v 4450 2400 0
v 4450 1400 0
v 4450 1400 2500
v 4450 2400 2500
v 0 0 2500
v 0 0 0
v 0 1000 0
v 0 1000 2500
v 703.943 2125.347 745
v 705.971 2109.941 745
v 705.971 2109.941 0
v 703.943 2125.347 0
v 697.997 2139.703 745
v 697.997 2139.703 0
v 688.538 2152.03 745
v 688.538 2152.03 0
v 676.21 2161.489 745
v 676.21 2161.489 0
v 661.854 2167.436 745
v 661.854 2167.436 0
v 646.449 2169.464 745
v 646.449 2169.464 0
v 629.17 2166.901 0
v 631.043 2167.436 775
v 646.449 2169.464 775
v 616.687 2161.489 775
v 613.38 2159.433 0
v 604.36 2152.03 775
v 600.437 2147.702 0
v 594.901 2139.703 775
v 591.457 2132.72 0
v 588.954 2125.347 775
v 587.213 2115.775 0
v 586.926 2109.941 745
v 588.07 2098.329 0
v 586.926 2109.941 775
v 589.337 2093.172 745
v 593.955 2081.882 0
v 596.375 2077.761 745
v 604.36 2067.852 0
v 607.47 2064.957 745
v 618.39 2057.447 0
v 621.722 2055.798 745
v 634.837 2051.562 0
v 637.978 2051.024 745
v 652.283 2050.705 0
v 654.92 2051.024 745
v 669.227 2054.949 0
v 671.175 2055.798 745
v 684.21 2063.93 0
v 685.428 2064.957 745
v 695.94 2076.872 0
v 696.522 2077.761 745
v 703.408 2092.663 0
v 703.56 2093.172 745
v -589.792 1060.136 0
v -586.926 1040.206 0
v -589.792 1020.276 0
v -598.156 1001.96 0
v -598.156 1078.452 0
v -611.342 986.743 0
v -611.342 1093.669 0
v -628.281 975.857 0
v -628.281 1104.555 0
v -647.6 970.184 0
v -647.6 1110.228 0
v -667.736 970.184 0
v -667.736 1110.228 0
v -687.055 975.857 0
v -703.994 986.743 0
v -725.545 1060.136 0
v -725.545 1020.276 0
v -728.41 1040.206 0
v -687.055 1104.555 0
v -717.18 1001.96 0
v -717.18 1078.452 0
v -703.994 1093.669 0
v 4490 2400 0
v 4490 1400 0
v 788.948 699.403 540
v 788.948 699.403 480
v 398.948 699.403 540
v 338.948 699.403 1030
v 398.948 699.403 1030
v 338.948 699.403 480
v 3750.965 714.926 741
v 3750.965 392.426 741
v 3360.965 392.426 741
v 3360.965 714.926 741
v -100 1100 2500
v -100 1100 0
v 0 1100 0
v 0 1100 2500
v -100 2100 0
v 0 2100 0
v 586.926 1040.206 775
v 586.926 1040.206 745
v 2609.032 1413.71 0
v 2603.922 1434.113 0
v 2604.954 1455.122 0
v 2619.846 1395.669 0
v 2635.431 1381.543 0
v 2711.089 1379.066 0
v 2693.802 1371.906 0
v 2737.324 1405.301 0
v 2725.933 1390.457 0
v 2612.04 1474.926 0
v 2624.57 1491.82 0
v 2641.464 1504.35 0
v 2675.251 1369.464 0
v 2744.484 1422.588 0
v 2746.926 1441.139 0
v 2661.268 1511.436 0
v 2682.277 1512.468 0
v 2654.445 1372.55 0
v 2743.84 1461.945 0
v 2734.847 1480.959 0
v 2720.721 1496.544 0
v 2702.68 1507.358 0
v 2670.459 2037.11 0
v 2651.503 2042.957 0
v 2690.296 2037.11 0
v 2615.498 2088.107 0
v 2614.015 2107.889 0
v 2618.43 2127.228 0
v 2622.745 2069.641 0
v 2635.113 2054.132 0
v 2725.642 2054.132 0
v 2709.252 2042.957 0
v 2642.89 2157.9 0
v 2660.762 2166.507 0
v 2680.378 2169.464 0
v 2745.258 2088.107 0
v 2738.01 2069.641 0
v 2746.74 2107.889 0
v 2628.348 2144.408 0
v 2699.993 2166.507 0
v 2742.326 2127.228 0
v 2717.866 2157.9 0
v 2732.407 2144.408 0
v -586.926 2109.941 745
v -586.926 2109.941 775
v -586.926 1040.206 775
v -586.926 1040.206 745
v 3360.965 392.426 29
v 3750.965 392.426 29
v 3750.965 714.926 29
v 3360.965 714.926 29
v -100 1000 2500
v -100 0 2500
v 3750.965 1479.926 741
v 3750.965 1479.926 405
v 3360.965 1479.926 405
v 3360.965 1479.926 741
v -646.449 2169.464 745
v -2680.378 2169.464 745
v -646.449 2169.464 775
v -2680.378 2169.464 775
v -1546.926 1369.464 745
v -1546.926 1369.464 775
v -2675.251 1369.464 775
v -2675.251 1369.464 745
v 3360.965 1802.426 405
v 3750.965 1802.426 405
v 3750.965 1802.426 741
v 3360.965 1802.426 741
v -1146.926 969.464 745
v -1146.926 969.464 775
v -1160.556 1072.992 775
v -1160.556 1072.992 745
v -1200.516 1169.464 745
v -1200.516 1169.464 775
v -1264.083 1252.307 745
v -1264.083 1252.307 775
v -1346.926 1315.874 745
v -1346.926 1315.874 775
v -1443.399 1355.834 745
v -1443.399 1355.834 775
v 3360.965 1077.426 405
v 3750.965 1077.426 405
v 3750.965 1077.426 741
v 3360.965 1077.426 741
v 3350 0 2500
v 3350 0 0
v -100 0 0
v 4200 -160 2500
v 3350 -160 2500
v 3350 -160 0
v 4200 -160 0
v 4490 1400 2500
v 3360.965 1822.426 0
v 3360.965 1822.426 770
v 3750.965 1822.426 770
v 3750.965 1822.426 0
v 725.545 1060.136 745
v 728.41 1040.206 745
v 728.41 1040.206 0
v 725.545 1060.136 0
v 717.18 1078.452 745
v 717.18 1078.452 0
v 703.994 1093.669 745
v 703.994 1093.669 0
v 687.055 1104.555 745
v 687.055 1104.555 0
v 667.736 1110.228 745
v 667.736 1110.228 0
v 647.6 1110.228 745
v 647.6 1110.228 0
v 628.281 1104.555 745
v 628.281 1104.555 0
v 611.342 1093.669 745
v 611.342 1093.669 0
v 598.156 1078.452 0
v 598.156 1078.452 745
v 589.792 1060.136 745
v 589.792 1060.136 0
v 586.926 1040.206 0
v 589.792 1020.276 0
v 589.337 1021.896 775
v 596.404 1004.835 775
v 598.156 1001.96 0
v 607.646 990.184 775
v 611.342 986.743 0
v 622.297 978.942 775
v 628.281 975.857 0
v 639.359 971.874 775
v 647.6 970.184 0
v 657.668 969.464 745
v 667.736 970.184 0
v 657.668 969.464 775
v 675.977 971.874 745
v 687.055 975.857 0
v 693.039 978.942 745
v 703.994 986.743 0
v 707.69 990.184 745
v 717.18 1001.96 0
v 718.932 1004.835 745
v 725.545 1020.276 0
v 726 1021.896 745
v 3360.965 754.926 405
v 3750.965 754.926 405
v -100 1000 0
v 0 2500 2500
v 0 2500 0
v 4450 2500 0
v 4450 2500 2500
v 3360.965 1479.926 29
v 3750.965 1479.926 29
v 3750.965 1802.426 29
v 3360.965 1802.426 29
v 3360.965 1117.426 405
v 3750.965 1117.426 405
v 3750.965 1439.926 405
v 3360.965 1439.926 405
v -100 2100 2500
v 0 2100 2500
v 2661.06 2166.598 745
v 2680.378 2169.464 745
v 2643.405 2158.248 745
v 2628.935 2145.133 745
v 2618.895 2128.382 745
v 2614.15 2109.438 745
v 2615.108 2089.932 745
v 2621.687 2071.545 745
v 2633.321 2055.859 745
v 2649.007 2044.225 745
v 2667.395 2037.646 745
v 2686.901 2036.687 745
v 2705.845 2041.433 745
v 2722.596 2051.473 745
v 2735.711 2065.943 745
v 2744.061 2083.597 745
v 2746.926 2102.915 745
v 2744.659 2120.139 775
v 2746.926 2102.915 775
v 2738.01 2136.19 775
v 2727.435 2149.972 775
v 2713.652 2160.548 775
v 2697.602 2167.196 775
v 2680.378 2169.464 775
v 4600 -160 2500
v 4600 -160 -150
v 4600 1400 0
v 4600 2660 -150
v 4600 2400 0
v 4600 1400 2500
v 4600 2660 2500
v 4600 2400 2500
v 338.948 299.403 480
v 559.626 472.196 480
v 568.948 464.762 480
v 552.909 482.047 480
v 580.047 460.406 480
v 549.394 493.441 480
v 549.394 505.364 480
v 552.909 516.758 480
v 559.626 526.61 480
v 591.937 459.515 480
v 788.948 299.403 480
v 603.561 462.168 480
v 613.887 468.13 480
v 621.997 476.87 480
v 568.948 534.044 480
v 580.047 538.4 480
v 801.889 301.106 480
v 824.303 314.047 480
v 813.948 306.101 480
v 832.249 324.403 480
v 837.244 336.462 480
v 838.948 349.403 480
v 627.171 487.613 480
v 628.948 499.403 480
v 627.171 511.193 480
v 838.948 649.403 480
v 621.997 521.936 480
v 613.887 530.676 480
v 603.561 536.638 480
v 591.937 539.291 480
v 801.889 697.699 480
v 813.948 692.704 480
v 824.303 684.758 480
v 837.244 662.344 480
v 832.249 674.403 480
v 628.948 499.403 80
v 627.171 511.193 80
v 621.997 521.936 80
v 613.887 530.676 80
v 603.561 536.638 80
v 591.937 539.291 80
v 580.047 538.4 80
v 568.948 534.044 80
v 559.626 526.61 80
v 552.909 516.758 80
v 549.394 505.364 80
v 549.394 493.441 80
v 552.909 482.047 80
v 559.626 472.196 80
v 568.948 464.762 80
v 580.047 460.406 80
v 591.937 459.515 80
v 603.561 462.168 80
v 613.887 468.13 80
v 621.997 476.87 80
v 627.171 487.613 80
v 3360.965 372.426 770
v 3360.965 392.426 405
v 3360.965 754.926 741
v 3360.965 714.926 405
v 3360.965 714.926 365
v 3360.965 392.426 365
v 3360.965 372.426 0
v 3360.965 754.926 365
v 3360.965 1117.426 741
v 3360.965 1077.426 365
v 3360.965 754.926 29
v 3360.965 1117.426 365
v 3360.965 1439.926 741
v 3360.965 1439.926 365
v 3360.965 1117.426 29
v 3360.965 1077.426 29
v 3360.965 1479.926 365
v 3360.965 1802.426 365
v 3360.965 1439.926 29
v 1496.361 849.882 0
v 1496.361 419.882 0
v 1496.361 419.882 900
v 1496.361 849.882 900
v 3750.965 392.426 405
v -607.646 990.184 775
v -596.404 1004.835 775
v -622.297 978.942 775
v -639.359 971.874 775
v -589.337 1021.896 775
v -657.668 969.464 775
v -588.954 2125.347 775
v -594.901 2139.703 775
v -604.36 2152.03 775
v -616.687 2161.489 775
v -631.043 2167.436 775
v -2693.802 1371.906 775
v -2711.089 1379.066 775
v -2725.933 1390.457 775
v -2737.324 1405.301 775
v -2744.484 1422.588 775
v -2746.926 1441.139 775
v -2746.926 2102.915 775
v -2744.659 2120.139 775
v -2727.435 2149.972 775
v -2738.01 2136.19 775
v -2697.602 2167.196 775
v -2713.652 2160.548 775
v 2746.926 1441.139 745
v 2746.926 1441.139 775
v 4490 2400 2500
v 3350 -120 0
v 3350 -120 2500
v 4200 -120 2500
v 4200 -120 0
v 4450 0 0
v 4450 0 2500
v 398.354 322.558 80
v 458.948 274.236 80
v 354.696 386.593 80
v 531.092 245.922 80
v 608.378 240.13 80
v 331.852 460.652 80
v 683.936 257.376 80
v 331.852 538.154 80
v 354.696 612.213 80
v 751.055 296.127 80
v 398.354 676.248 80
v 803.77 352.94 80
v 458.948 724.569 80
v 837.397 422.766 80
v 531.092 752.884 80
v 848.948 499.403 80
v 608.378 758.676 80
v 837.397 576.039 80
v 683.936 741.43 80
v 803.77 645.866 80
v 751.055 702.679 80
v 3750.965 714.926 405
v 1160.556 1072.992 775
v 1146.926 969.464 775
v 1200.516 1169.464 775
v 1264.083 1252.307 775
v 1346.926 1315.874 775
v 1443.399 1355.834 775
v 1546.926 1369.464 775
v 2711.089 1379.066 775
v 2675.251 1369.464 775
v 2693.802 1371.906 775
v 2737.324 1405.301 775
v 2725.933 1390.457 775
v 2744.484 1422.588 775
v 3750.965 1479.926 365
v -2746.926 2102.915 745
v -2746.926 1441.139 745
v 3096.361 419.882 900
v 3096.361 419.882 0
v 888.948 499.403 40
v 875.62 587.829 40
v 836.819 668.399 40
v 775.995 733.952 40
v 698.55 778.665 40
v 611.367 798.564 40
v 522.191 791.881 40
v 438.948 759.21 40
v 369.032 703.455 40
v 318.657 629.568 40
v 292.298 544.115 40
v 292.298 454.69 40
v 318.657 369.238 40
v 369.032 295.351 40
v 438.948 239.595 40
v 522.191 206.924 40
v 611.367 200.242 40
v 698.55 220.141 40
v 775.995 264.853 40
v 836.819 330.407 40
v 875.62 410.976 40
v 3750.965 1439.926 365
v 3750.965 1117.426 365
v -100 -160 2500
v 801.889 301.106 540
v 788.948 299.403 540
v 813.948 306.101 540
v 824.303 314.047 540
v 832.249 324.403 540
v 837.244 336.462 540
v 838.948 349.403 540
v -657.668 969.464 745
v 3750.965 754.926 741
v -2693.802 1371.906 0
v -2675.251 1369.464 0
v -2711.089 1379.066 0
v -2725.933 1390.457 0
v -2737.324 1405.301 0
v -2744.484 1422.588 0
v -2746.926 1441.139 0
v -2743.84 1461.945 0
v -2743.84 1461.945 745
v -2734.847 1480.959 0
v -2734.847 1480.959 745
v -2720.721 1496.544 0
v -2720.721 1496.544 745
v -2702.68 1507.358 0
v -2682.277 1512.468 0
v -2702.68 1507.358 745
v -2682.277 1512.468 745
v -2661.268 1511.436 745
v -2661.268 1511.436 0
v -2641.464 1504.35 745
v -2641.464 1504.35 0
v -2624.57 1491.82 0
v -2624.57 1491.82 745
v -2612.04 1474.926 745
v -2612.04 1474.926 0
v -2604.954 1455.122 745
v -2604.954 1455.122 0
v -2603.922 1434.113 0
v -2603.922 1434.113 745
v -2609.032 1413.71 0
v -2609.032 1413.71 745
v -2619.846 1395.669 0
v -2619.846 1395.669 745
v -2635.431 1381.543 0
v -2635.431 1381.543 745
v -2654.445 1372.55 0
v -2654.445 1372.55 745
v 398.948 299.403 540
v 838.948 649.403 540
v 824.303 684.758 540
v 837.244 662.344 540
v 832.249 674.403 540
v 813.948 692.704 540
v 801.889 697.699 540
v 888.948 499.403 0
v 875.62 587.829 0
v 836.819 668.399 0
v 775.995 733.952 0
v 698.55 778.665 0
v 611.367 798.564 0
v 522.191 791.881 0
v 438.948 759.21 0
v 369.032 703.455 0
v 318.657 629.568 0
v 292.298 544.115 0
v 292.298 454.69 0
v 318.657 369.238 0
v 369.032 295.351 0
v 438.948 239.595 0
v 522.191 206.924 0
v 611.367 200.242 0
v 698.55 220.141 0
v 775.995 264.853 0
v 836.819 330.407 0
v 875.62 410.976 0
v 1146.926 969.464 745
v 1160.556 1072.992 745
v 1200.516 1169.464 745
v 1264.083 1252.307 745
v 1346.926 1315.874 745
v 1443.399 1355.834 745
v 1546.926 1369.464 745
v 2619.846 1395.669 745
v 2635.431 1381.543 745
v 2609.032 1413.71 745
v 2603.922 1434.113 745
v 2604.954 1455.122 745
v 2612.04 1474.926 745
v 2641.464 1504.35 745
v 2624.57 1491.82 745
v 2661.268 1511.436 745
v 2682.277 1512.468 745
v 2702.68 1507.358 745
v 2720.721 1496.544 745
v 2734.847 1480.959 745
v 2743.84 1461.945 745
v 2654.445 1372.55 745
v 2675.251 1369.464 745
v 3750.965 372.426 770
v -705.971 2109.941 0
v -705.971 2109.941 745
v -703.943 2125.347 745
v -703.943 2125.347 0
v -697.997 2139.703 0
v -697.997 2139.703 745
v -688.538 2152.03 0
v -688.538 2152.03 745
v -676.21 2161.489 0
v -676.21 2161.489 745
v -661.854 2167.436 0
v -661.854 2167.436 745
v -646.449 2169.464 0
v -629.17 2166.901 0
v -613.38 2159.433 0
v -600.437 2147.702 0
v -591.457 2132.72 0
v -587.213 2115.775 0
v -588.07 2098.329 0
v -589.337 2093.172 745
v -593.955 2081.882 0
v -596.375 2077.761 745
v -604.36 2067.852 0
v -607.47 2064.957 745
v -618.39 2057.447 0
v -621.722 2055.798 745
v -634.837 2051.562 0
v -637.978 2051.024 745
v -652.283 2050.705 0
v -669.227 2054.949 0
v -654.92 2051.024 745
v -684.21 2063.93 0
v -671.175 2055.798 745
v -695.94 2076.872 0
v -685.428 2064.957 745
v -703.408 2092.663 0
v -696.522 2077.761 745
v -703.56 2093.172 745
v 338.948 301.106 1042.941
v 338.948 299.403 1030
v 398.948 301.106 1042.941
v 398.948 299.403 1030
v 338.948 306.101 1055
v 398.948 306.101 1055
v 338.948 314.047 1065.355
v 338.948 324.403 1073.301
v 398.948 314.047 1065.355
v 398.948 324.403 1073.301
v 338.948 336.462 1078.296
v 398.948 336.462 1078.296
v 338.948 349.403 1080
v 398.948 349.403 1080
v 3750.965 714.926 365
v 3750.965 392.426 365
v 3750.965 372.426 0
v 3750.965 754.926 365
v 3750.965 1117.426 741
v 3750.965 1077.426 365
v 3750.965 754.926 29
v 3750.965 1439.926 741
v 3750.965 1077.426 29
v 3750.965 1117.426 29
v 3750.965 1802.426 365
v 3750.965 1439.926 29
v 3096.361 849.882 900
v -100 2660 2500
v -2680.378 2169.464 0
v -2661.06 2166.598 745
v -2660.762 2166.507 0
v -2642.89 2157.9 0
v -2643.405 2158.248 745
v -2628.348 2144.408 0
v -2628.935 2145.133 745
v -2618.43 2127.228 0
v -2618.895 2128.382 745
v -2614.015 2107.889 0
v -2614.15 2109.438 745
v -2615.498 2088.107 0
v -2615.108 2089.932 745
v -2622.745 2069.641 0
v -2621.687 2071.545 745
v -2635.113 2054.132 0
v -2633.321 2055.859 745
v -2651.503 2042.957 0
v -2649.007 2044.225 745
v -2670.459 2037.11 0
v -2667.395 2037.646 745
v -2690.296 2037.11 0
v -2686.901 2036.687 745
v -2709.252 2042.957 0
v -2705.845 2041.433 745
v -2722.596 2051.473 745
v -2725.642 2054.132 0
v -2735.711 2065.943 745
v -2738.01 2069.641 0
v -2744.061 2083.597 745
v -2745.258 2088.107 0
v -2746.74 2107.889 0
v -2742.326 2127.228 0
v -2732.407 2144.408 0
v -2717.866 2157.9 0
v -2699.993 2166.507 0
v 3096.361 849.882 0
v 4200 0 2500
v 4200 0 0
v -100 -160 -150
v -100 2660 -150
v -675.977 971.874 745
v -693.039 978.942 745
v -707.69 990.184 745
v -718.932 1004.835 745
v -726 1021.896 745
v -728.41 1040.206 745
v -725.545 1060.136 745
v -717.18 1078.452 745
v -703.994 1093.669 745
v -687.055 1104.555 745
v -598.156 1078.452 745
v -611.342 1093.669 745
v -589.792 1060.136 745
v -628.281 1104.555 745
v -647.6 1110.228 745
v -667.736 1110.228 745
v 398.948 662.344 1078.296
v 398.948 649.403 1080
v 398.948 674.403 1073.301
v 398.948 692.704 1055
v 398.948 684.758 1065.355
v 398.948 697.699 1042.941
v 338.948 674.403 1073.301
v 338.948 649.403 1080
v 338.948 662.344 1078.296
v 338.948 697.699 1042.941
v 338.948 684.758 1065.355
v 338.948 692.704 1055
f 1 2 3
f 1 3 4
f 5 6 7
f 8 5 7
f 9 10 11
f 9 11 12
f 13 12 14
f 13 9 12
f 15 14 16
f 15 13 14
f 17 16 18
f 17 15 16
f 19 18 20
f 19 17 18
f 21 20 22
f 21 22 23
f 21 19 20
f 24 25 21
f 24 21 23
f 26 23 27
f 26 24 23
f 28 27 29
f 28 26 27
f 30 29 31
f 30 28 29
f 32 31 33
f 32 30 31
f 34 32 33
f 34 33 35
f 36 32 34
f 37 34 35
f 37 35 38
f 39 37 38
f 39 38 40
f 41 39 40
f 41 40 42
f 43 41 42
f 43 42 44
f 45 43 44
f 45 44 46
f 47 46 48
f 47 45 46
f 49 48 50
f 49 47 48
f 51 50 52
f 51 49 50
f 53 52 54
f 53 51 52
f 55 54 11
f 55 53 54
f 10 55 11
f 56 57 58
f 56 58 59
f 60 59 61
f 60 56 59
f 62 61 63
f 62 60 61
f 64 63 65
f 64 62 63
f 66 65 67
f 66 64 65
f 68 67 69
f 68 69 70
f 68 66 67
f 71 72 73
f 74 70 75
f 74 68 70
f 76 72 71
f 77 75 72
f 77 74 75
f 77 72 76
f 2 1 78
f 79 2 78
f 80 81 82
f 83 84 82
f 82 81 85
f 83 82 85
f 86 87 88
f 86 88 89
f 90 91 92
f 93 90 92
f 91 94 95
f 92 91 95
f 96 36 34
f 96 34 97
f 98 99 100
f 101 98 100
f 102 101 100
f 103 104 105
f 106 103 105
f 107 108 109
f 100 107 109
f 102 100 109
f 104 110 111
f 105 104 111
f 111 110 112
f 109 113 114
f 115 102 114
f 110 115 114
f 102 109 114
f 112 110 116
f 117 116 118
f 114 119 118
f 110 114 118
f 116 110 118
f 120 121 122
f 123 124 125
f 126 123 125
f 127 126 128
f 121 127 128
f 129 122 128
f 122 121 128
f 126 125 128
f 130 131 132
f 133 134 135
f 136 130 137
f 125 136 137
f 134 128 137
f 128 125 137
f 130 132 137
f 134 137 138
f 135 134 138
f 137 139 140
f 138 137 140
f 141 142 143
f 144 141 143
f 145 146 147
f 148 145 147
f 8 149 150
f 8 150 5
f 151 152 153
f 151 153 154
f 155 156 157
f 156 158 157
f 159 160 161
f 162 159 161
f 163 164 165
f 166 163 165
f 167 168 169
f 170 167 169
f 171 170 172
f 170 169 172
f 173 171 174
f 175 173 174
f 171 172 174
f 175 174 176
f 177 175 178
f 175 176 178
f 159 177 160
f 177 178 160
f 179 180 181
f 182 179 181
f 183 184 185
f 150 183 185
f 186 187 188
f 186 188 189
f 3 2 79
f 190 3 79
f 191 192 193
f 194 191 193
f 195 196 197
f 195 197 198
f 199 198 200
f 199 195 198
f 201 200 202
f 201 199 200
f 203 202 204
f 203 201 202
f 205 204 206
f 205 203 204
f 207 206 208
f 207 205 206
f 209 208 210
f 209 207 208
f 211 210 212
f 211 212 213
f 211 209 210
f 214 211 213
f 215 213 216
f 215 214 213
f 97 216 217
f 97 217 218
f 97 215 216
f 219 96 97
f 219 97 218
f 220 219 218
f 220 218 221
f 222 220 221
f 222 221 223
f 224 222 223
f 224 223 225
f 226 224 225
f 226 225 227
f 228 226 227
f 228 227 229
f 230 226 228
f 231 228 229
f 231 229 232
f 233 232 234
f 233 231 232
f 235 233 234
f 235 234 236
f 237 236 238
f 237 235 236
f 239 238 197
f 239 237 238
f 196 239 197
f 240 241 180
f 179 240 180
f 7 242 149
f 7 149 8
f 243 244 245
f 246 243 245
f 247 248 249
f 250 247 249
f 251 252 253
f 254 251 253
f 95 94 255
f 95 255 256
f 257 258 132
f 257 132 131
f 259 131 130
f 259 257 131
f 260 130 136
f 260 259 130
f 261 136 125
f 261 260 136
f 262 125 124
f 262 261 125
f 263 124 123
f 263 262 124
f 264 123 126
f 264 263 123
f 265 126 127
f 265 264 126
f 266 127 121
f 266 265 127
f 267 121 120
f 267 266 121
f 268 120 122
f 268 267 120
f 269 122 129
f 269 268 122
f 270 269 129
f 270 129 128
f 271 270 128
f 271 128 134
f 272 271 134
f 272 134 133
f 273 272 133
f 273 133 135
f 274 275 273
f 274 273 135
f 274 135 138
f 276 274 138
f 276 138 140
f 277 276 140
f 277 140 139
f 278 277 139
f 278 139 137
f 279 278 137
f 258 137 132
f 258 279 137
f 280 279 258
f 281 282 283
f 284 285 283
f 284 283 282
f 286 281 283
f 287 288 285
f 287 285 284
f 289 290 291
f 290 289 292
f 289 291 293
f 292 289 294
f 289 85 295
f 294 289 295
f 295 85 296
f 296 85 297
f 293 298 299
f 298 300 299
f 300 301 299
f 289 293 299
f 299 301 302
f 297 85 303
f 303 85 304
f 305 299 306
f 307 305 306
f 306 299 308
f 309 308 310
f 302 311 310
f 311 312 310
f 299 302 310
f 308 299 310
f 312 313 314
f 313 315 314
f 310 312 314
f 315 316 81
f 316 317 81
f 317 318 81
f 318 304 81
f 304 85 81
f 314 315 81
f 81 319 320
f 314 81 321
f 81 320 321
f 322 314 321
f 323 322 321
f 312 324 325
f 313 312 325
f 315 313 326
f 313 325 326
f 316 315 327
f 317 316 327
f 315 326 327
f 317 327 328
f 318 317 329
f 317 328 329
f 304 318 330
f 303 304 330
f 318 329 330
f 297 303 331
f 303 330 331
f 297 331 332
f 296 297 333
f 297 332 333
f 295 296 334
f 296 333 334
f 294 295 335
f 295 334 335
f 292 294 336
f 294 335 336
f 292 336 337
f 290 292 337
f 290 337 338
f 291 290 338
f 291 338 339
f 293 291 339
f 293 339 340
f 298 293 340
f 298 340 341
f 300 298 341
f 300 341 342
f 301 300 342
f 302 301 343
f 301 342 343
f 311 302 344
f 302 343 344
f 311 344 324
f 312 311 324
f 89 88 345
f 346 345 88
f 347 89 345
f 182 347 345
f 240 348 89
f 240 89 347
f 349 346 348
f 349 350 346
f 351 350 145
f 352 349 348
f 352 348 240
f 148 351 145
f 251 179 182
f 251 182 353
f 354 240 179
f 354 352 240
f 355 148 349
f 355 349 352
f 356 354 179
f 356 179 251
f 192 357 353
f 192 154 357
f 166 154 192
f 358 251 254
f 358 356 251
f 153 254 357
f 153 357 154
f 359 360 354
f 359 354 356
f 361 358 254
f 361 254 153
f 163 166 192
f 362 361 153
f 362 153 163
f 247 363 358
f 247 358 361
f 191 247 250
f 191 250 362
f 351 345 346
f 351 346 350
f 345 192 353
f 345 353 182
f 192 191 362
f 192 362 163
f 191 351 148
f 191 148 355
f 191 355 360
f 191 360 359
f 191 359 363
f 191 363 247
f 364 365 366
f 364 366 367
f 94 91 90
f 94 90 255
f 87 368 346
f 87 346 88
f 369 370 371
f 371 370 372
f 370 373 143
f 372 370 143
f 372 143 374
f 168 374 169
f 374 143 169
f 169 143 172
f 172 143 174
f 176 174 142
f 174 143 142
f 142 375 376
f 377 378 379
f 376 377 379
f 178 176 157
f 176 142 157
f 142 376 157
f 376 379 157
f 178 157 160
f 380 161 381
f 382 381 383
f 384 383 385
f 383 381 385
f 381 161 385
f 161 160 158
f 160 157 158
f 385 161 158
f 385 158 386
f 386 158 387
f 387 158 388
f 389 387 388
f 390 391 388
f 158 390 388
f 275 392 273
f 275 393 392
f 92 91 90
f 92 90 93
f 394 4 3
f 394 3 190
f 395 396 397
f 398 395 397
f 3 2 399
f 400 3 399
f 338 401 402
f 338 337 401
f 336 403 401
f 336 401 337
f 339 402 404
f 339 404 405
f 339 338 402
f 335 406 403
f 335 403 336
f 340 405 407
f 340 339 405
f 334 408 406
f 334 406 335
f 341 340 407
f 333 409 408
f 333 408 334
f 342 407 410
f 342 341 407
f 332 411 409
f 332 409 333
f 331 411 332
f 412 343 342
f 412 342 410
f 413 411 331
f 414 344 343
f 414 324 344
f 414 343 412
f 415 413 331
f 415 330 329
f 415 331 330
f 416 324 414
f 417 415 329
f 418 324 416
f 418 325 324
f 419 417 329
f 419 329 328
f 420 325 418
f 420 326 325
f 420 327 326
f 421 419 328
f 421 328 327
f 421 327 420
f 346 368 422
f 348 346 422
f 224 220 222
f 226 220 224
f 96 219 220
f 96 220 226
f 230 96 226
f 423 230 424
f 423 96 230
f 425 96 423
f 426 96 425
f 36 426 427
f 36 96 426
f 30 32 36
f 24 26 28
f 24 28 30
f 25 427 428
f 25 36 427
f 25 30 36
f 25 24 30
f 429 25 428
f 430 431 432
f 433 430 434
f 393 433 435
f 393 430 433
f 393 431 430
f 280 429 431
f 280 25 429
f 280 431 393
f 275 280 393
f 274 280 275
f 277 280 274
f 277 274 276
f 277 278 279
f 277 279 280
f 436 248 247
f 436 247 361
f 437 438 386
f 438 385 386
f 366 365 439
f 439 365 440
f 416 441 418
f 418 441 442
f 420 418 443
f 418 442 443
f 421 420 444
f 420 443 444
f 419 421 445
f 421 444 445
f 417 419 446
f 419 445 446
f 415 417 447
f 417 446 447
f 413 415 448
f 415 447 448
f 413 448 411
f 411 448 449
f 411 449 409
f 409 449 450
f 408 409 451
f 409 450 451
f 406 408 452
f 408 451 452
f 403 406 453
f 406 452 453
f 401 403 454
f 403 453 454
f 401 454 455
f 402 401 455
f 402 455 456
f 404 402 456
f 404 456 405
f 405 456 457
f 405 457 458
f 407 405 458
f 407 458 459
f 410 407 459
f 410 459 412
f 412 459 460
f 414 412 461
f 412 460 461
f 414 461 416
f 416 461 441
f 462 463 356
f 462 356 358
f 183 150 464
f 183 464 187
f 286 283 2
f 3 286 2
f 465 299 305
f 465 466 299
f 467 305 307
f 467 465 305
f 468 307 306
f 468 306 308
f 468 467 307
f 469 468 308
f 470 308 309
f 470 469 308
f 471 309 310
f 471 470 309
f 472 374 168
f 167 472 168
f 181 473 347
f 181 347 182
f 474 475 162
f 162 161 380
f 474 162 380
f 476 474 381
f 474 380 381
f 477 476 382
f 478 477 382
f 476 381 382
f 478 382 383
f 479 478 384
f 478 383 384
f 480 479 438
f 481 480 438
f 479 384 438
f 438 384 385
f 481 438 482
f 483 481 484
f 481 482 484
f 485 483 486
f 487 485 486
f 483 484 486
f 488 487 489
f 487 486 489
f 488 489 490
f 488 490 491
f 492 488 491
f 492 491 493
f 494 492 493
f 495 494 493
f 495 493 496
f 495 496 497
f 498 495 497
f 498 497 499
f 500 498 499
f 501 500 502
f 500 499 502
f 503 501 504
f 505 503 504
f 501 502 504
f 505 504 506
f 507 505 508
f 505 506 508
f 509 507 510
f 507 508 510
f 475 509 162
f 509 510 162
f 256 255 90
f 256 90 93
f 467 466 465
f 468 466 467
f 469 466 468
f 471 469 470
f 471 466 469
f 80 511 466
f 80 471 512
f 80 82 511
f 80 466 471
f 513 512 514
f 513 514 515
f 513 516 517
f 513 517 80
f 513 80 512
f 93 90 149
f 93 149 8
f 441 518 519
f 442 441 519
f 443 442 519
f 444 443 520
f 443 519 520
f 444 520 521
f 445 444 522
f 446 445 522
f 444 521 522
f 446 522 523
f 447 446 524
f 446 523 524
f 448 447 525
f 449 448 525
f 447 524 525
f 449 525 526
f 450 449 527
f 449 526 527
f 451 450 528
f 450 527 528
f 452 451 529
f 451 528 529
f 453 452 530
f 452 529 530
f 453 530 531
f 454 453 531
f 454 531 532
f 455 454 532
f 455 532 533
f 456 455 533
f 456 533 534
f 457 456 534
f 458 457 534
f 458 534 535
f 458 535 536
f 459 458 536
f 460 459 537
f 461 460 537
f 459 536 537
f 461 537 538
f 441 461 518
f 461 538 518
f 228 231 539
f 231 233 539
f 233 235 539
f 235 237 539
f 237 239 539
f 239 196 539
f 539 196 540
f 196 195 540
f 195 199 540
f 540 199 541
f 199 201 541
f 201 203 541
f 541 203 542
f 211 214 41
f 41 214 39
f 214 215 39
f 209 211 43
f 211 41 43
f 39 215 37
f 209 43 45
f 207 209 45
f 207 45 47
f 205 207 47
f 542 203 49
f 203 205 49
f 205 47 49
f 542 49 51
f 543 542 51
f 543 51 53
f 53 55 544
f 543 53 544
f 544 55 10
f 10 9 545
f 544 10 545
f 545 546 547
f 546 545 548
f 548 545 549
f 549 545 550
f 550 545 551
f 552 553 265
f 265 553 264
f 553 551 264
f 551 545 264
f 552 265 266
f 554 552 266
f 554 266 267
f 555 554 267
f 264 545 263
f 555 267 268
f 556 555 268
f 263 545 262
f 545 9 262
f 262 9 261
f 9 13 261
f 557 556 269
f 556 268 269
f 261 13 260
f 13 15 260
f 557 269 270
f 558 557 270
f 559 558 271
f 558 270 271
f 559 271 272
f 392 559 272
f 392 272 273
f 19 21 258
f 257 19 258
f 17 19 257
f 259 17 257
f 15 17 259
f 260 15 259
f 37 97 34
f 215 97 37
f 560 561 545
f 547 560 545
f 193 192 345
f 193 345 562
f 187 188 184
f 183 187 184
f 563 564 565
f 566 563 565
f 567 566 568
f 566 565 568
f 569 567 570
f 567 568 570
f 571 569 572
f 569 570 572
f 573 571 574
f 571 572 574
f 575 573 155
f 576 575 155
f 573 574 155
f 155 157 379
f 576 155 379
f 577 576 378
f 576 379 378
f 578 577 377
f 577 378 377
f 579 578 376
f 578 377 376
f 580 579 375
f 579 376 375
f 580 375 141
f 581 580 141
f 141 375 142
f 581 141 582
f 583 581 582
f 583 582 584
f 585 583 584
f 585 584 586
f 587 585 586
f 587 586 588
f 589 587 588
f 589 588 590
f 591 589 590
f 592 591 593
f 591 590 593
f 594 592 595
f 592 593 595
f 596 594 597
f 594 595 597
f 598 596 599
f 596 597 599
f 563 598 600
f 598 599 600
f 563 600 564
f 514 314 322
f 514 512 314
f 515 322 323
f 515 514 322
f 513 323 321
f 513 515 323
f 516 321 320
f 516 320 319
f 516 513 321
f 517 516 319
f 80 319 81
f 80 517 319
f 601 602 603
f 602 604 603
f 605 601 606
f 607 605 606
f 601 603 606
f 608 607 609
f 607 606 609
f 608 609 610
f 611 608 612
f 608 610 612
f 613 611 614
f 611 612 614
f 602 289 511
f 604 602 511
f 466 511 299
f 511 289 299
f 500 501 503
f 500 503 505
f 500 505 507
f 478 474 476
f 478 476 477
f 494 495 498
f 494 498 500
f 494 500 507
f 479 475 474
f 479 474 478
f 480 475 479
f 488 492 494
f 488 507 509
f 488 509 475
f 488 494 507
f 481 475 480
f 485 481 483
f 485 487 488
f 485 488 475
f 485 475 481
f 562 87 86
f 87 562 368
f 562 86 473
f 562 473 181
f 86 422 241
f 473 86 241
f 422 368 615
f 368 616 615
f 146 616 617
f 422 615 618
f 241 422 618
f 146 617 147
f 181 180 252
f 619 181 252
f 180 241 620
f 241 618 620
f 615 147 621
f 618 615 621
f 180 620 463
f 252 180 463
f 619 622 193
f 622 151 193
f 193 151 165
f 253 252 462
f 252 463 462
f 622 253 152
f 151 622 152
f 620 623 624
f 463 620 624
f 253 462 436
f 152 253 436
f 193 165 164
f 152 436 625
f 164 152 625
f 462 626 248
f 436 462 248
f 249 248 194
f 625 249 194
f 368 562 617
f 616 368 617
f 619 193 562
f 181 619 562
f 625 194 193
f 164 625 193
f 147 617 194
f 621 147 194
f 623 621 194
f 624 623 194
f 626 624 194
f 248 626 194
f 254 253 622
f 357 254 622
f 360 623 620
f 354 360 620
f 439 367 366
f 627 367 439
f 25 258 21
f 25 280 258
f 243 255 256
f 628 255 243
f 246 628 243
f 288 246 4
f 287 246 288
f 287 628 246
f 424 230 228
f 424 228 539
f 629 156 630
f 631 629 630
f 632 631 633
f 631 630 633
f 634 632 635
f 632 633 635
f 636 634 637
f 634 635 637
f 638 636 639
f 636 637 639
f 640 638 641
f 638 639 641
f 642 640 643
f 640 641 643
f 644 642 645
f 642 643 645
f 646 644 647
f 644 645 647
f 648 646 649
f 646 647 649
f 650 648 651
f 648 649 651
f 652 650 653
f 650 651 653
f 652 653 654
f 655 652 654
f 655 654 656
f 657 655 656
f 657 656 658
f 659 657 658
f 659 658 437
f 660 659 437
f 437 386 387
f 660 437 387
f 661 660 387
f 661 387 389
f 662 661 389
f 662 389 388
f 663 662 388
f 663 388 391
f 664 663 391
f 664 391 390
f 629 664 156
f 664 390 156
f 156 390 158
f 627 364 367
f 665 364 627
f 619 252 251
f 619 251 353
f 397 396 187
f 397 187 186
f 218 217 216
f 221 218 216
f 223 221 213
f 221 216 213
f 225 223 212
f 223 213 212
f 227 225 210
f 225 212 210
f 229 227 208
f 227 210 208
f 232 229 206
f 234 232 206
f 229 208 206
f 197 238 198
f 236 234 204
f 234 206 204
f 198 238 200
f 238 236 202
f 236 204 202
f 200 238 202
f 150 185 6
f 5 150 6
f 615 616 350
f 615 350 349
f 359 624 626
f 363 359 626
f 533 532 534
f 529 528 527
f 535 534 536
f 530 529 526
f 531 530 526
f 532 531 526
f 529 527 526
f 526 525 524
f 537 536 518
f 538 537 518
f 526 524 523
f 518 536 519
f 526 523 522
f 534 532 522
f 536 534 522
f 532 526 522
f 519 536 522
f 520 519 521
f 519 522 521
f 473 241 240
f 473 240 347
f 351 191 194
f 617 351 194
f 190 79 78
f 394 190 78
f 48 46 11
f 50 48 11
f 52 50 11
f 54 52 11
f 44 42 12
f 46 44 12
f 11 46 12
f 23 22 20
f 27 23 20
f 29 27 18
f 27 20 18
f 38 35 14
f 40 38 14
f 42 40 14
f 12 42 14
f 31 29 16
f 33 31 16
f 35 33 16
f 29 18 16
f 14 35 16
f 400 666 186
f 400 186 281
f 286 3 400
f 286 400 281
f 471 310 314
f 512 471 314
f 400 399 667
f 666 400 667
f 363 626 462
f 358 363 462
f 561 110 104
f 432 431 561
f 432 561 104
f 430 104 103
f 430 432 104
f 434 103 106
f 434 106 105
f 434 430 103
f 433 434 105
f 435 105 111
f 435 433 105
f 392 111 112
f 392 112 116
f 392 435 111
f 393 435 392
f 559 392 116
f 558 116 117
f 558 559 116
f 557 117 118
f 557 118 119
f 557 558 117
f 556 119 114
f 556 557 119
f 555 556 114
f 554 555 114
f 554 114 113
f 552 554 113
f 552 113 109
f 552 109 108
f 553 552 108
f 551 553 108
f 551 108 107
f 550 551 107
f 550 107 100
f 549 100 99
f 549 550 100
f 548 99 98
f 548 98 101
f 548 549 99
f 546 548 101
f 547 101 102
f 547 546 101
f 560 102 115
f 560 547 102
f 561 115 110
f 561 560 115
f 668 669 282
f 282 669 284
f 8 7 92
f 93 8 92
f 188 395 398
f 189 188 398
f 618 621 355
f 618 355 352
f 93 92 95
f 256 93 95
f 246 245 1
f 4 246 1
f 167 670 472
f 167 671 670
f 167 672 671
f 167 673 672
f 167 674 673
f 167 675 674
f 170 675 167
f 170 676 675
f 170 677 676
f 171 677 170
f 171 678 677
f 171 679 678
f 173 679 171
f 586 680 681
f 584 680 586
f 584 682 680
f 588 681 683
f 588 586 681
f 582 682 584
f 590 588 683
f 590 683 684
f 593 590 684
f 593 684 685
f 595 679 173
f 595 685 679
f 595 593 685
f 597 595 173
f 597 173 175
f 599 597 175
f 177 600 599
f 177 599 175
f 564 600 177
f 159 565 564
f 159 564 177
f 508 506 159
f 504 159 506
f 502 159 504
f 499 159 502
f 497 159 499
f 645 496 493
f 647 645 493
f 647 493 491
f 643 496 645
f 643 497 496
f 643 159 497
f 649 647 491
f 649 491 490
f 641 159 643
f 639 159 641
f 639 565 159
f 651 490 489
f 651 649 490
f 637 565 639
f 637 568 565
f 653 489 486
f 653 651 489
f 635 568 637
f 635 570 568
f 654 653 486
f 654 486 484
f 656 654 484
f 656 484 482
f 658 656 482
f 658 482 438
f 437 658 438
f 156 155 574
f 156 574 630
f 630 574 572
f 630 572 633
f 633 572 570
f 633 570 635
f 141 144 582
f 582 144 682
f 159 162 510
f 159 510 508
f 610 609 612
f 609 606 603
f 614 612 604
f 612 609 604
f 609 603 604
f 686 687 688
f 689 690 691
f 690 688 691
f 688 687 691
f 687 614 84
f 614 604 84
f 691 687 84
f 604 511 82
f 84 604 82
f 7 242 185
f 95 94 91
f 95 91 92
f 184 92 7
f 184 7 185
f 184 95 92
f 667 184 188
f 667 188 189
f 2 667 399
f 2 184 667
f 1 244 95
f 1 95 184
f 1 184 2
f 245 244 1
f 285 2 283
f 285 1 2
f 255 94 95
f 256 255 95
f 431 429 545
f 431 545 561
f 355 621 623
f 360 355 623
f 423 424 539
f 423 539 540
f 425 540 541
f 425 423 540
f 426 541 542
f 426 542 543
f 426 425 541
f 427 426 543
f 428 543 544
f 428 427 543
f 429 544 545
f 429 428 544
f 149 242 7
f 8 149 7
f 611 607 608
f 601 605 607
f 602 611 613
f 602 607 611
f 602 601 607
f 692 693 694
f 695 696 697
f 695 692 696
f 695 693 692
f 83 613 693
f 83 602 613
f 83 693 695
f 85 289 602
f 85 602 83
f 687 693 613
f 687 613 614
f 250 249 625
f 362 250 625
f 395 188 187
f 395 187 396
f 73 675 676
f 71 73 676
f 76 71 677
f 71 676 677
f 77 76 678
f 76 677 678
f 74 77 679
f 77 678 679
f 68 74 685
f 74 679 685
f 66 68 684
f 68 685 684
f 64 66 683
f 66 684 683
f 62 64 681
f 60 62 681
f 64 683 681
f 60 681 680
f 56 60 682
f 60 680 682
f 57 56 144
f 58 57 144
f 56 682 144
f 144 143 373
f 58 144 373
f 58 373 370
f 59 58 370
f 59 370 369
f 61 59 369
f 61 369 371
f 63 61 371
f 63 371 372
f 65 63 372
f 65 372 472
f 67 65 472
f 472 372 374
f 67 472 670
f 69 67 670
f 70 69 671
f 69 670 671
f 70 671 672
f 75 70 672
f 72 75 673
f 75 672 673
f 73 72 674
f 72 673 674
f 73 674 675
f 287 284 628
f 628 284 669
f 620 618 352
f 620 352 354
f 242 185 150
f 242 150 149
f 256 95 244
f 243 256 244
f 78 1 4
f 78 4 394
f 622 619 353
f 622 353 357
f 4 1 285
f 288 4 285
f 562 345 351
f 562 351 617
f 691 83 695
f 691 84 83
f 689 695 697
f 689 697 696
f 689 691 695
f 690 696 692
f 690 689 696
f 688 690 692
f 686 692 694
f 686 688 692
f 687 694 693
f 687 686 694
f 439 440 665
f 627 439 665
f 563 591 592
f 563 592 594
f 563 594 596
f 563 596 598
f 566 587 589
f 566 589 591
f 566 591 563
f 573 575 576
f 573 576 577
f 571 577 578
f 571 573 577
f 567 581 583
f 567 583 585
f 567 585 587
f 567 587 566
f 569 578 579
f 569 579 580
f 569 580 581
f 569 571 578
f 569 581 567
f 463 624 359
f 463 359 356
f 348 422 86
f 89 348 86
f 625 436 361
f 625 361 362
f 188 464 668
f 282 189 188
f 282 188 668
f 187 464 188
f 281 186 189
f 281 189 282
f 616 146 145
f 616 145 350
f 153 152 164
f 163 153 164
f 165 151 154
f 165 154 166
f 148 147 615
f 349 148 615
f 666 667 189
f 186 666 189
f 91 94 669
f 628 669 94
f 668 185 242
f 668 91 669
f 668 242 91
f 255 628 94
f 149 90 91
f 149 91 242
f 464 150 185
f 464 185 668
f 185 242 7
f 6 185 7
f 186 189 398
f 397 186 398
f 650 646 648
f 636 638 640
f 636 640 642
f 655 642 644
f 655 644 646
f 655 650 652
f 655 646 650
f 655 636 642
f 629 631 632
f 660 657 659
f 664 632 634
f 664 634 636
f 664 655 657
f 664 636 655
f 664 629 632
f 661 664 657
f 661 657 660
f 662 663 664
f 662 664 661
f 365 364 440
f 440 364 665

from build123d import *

# Parameters (mm, degrees)
F0_W      = 100
F0_H      = 1000
F0_H_2    = 100
F0_W_2    = 850
F0_H_3    = 120
F0_H_4    = 40
F0_W_3    = 110
F0_W_4    = 40
F1_DEPTH  = 150
F2_DEPTH  = 150
F3_DEPTH  = 2500
F4_DEPTH  = 2500
F5_DEPTH  = 2500
F8_DEPTH  = 15
F9_DEPTH  = 760
F11_W     = 1600
F11_H     = 430
F12_DEPTH = 900
F13_W     = 390
F13_H     = 1450
F14_DEPTH = 770
F15_W     = 322.5
F15_H     = 336
F16_DEPTH = 390
F17_R     = 300
F18_DEPTH = 80
F19_R     = 40
F20_DEPTH = 400
F21_W     = 440
F21_H     = 400
F21_W_2   = 60
F22_DEPTH = 60
F23_DEPTH = 600
F24_R     = 50
F25_SIZE  = 40


with BuildPart() as f1:
    # F0 (on Top) → F1 (new body)
    with BuildSketch(Plane.XY):
        Polygon((300, 2500), (300, 0), (3350, 0), (4200, 0), (4450, 0), (4450, 1400), (4450, 2400), (4450, 2500), align=None)
        Polygon((0, 2500), (300, 2500), (4450, 2500), (4450, 2400), (4490, 2400), (4600, 2400), (4600, 2660), (-100, 2660), (-100, 2100), (0, 2100), align=None)
        with Locations((-50, 1600)):
            Rectangle(F0_W, F0_H)
        with Locations((-50, 1050)):
            Rectangle(F0_W, F0_H_2)
        with Locations((-50, 500)):
            Rectangle(F0_W, F0_H)
        Polygon((300, 0), (0, 0), (-100, 0), (-100, -160), (3350, -160), (3350, -120), (3350, 0), align=None)
        with Locations((3775, -60)):
            Rectangle(F0_W_2, F0_H_3)
        with Locations((3775, -140)):
            Rectangle(F0_W_2, F0_H_4)
        Polygon((4450, 0), (4200, 0), (4200, -120), (4200, -160), (4600, -160), (4600, 1400), (4490, 1400), (4450, 1400), align=None)
        with Locations((4545, 1900)):
            Rectangle(F0_W_3, F0_H)
        with Locations((4470, 1900)):
            Rectangle(F0_W_4, F0_H)
    extrude(amount=-F1_DEPTH)

    # F0 (on Top) → F2 (join, through all)
    with BuildSketch(Plane.XY):
        Polygon((0, 1000), (0, 0), (300, 0), (300, 2500), (0, 2500), (0, 2100), (0, 1100), align=None)
    extrude(amount=-F2_DEPTH)

    # F0 (on Top) → F3 (join)
    with BuildSketch(Plane.XY):
        Polygon((0, 2500), (300, 2500), (4450, 2500), (4450, 2400), (4490, 2400), (4600, 2400), (4600, 2660), (-100, 2660), (-100, 2100), (0, 2100), align=None)
        Polygon((4450, 0), (4200, 0), (4200, -120), (4200, -160), (4600, -160), (4600, 1400), (4490, 1400), (4450, 1400), align=None)
        Polygon((300, 0), (0, 0), (-100, 0), (-100, -160), (3350, -160), (3350, -120), (3350, 0), align=None)
        with Locations((-50, 1050)):
            Rectangle(F0_W, F0_H_2)
    extrude(amount=F3_DEPTH)


with BuildPart() as f4:
    # F0 (on Top) → F4 (new body, through all)
    with BuildSketch(Plane.XY):
        with Locations((-50, 1600)):
            Rectangle(F0_W, F0_H)
    extrude(amount=F4_DEPTH)


with BuildPart() as f4b:
    # F0 (on Top) → F4, piece 2 (new body, through all)
    with BuildSketch(Plane.XY):
        with Locations((-50, 500)):
            Rectangle(F0_W, F0_H)
    extrude(amount=F4_DEPTH)


with BuildPart() as f5:
    # F0 (on Top) → F5 (new body, through all)
    with BuildSketch(Plane.XY):
        with Locations((4470, 1900)):
            Rectangle(F0_W_4, F0_H)
    extrude(amount=F5_DEPTH)


with BuildPart() as f5b:
    # F0 (on Top) → F5, piece 2 (new body, through all)
    with BuildSketch(Plane.XY):
        with Locations((3775, -140)):
            Rectangle(F0_W_2, F0_H_4)
    extrude(amount=F5_DEPTH)


with BuildPart() as f8:
    # F7 (on offset) → F8 (new body, symmetric)
    with BuildSketch(Plane.XY.offset(760)):
        with BuildLine():
            Line((2680.377719402, 2169.4638956216), (646.4488137391, 2169.4638956216))
            ThreePointArc((646.4488137391, 2169.4638956216), (688.5376842462, 2152.0301146325), (705.9714652353, 2109.9412441254))
            ThreePointArc((705.9714652353, 2109.9412441254), (646.4488137391, 2050.4185926292), (586.9261622429, 2109.9412441254))
            Line((586.9261622429, 2109.9412441254), (586.9261622429, 1040.2058445736))
            ThreePointArc((586.9261622429, 1040.2058445736), (657.6681111949, 1110.9477935256), (728.410060147, 1040.2058445736))
            ThreePointArc((728.410060147, 1040.2058445736), (707.6902230133, 990.1837327553), (657.6681111949, 969.4638956216))
            Line((657.6681111949, 969.4638956216), (1146.9261622429, 969.4638956216))
            ThreePointArc((1146.9261622429, 969.4638956216), (1264.0834497683, 1252.3066080962), (1546.9261622429, 1369.4638956216))
            Line((1546.9261622429, 1369.4638956216), (2675.2513630672, 1369.4638956216))
            ThreePointArc((2675.2513630672, 1369.4638956216), (2624.5696265299, 1491.8204313346), (2746.9261622429, 1441.1386947972))
            Line((2746.9261622429, 1441.1386947972), (2746.9261622429, 2102.9154527807))
            ThreePointArc((2746.9261622429, 2102.9154527807), (2633.3208641919, 2055.8585975705), (2680.377719402, 2169.4638956216))
        make_face()
        with BuildLine():
            ThreePointArc((705.9714652353, 2109.9412441254), (688.5376842462, 2152.0301146325), (646.4488137391, 2169.4638956216))
            ThreePointArc((646.4488137391, 2169.4638956216), (604.3599432319, 2152.0301146325), (586.9261622429, 2109.9412441254))
            ThreePointArc((586.9261622429, 2109.9412441254), (646.4488137391, 2050.4185926292), (705.9714652353, 2109.9412441254))
        make_face()
        with BuildLine():
            ThreePointArc((2746.9261622429, 2102.9154527807), (2727.4345746122, 2149.9723079909), (2680.377719402, 2169.4638956216))
            ThreePointArc((2680.377719402, 2169.4638956216), (2633.3208641919, 2055.8585975705), (2746.9261622429, 2102.9154527807))
        make_face()
        with BuildLine():
            ThreePointArc((2675.2513630672, 1369.4638956216), (2725.9330996045, 1390.4569582599), (2746.9261622429, 1441.1386947972))
            ThreePointArc((2746.9261622429, 1441.1386947972), (2624.5696265299, 1491.8204313346), (2675.2513630672, 1369.4638956216))
        make_face()
        with BuildLine():
            ThreePointArc((728.410060147, 1040.2058445736), (657.6681111949, 1110.9477935256), (586.9261622429, 1040.2058445736))
            ThreePointArc((586.9261622429, 1040.2058445736), (607.6459993766, 990.1837327553), (657.6681111949, 969.4638956216))
            ThreePointArc((657.6681111949, 969.4638956216), (707.6902230133, 990.1837327553), (728.410060147, 1040.2058445736))
        make_face()
    extrude(amount=F8_DEPTH, both=True)

    # F7 (on offset) → F9 (join, through all)
    with BuildSketch(Plane.XY.offset(760)):
        with BuildLine():
            ThreePointArc((705.9714652353, 2109.9412441254), (688.5376842462, 2152.0301146325), (646.4488137391, 2169.4638956216))
            ThreePointArc((646.4488137391, 2169.4638956216), (604.3599432319, 2152.0301146325), (586.9261622429, 2109.9412441254))
            ThreePointArc((586.9261622429, 2109.9412441254), (646.4488137391, 2050.4185926292), (705.9714652353, 2109.9412441254))
        make_face()
        with BuildLine():
            ThreePointArc((2746.9261622429, 2102.9154527807), (2727.4345746122, 2149.9723079909), (2680.377719402, 2169.4638956216))
            ThreePointArc((2680.377719402, 2169.4638956216), (2633.3208641919, 2055.8585975705), (2746.9261622429, 2102.9154527807))
        make_face()
        with BuildLine():
            ThreePointArc((2675.2513630672, 1369.4638956216), (2725.9330996045, 1390.4569582599), (2746.9261622429, 1441.1386947972))
            ThreePointArc((2746.9261622429, 1441.1386947972), (2624.5696265299, 1491.8204313346), (2675.2513630672, 1369.4638956216))
        make_face()
        with BuildLine():
            ThreePointArc((728.410060147, 1040.2058445736), (657.6681111949, 1110.9477935256), (586.9261622429, 1040.2058445736))
            ThreePointArc((586.9261622429, 1040.2058445736), (607.6459993766, 990.1837327553), (657.6681111949, 969.4638956216))
            ThreePointArc((657.6681111949, 969.4638956216), (707.6902230133, 990.1837327553), (728.410060147, 1040.2058445736))
        make_face()
    extrude(amount=-F9_DEPTH)


with BuildPart() as f10_1:
    # F10: instance of F8
    add(f8.part.mirror(Plane.YZ))


with BuildPart() as f12:
    # F11 (on Top) → F12 (new body)
    with BuildSketch(Plane.XY):
        with Locations((2296.36054039, 634.8821485043)):
            Rectangle(F11_W, F11_H)
    extrude(amount=F12_DEPTH)


with BuildPart() as f14:
    # F13 (on Top) → F14 (new body)
    with BuildSketch(Plane.XY):
        with Locations((3555.9650611877, 1097.4260926247)):
            Rectangle(F13_W, F13_H)
    extrude(amount=F14_DEPTH)

    # F15 (on face) → F16 (cut, through all)
    with BuildSketch(Plane.YZ.offset(3750.9650611877)):
        with Locations((553.6760926247, 573)):
            Rectangle(F15_W, F15_H)
        with Locations((916.1760926247, 573)):
            Rectangle(F15_W, F15_H)
        with Locations((916.1760926247, 197)):
            Rectangle(F15_W, F15_H)
        with Locations((553.6760926247, 197)):
            Rectangle(F15_W, F15_H)
        with Locations((1278.6760926247, 573)):
            Rectangle(F15_W, F15_H)
        with Locations((1641.1760926247, 573)):
            Rectangle(F15_W, F15_H)
        with Locations((1278.6760926247, 197)):
            Rectangle(F15_W, F15_H)
        with Locations((1641.1760926247, 197)):
            Rectangle(F15_W, F15_H)
    extrude(amount=-F16_DEPTH, mode=Mode.SUBTRACT)


with BuildPart() as f18:
    # F17 (on Top) → F18 (new body)
    with BuildSketch(Plane.XY):
        with Locations((588.9477133751, 499.4027614594)):
            Circle(F17_R)
    extrude(amount=F18_DEPTH)

    # F19 (on face) → F20 (join)
    with BuildSketch(Plane.XY.offset(80)):
        with Locations((588.9477133751, 499.4027614594)):
            Circle(F19_R)
    extrude(amount=F20_DEPTH)

    # F21 (on face) → F22 (join)
    with BuildSketch(Plane.XY.offset(480)):
        with Locations((618.9477133751, 499.4027614594)):
            Rectangle(F21_W, F21_H)
        with Locations((368.9477133751, 499.4027614594)):
            Rectangle(F21_W_2, F21_H)
    extrude(amount=F22_DEPTH)

    # F21 (on face) → F23 (join)
    with BuildSketch(Plane.XY.offset(480)):
        with Locations((368.9477133751, 499.4027614594)):
            Rectangle(F21_W_2, F21_H)
    extrude(amount=F23_DEPTH)

    # F24
    f24_edges = [f18.edges().sort_by_distance(p)[0] for p in [
        (838.947713, 699.402761, 510),
        (838.947713, 299.402761, 510),
        (368.947713, 299.402761, 1080),
        (368.947713, 699.402761, 1080),
    ]]
    fillet(f24_edges, radius=F24_R)

    # F25
    f25_edges = [f18.edges().sort_by_distance(p)[0] for p in [
        (288.947713, 499.402761, 80),
    ]]
    chamfer(f25_edges, length=F25_SIZE)


solid = Compound([f1.part, f4.part, f4b.part, f5.part, f5b.part, f8.part, f10_1.part, f12.part, f14.part, f18.part])
